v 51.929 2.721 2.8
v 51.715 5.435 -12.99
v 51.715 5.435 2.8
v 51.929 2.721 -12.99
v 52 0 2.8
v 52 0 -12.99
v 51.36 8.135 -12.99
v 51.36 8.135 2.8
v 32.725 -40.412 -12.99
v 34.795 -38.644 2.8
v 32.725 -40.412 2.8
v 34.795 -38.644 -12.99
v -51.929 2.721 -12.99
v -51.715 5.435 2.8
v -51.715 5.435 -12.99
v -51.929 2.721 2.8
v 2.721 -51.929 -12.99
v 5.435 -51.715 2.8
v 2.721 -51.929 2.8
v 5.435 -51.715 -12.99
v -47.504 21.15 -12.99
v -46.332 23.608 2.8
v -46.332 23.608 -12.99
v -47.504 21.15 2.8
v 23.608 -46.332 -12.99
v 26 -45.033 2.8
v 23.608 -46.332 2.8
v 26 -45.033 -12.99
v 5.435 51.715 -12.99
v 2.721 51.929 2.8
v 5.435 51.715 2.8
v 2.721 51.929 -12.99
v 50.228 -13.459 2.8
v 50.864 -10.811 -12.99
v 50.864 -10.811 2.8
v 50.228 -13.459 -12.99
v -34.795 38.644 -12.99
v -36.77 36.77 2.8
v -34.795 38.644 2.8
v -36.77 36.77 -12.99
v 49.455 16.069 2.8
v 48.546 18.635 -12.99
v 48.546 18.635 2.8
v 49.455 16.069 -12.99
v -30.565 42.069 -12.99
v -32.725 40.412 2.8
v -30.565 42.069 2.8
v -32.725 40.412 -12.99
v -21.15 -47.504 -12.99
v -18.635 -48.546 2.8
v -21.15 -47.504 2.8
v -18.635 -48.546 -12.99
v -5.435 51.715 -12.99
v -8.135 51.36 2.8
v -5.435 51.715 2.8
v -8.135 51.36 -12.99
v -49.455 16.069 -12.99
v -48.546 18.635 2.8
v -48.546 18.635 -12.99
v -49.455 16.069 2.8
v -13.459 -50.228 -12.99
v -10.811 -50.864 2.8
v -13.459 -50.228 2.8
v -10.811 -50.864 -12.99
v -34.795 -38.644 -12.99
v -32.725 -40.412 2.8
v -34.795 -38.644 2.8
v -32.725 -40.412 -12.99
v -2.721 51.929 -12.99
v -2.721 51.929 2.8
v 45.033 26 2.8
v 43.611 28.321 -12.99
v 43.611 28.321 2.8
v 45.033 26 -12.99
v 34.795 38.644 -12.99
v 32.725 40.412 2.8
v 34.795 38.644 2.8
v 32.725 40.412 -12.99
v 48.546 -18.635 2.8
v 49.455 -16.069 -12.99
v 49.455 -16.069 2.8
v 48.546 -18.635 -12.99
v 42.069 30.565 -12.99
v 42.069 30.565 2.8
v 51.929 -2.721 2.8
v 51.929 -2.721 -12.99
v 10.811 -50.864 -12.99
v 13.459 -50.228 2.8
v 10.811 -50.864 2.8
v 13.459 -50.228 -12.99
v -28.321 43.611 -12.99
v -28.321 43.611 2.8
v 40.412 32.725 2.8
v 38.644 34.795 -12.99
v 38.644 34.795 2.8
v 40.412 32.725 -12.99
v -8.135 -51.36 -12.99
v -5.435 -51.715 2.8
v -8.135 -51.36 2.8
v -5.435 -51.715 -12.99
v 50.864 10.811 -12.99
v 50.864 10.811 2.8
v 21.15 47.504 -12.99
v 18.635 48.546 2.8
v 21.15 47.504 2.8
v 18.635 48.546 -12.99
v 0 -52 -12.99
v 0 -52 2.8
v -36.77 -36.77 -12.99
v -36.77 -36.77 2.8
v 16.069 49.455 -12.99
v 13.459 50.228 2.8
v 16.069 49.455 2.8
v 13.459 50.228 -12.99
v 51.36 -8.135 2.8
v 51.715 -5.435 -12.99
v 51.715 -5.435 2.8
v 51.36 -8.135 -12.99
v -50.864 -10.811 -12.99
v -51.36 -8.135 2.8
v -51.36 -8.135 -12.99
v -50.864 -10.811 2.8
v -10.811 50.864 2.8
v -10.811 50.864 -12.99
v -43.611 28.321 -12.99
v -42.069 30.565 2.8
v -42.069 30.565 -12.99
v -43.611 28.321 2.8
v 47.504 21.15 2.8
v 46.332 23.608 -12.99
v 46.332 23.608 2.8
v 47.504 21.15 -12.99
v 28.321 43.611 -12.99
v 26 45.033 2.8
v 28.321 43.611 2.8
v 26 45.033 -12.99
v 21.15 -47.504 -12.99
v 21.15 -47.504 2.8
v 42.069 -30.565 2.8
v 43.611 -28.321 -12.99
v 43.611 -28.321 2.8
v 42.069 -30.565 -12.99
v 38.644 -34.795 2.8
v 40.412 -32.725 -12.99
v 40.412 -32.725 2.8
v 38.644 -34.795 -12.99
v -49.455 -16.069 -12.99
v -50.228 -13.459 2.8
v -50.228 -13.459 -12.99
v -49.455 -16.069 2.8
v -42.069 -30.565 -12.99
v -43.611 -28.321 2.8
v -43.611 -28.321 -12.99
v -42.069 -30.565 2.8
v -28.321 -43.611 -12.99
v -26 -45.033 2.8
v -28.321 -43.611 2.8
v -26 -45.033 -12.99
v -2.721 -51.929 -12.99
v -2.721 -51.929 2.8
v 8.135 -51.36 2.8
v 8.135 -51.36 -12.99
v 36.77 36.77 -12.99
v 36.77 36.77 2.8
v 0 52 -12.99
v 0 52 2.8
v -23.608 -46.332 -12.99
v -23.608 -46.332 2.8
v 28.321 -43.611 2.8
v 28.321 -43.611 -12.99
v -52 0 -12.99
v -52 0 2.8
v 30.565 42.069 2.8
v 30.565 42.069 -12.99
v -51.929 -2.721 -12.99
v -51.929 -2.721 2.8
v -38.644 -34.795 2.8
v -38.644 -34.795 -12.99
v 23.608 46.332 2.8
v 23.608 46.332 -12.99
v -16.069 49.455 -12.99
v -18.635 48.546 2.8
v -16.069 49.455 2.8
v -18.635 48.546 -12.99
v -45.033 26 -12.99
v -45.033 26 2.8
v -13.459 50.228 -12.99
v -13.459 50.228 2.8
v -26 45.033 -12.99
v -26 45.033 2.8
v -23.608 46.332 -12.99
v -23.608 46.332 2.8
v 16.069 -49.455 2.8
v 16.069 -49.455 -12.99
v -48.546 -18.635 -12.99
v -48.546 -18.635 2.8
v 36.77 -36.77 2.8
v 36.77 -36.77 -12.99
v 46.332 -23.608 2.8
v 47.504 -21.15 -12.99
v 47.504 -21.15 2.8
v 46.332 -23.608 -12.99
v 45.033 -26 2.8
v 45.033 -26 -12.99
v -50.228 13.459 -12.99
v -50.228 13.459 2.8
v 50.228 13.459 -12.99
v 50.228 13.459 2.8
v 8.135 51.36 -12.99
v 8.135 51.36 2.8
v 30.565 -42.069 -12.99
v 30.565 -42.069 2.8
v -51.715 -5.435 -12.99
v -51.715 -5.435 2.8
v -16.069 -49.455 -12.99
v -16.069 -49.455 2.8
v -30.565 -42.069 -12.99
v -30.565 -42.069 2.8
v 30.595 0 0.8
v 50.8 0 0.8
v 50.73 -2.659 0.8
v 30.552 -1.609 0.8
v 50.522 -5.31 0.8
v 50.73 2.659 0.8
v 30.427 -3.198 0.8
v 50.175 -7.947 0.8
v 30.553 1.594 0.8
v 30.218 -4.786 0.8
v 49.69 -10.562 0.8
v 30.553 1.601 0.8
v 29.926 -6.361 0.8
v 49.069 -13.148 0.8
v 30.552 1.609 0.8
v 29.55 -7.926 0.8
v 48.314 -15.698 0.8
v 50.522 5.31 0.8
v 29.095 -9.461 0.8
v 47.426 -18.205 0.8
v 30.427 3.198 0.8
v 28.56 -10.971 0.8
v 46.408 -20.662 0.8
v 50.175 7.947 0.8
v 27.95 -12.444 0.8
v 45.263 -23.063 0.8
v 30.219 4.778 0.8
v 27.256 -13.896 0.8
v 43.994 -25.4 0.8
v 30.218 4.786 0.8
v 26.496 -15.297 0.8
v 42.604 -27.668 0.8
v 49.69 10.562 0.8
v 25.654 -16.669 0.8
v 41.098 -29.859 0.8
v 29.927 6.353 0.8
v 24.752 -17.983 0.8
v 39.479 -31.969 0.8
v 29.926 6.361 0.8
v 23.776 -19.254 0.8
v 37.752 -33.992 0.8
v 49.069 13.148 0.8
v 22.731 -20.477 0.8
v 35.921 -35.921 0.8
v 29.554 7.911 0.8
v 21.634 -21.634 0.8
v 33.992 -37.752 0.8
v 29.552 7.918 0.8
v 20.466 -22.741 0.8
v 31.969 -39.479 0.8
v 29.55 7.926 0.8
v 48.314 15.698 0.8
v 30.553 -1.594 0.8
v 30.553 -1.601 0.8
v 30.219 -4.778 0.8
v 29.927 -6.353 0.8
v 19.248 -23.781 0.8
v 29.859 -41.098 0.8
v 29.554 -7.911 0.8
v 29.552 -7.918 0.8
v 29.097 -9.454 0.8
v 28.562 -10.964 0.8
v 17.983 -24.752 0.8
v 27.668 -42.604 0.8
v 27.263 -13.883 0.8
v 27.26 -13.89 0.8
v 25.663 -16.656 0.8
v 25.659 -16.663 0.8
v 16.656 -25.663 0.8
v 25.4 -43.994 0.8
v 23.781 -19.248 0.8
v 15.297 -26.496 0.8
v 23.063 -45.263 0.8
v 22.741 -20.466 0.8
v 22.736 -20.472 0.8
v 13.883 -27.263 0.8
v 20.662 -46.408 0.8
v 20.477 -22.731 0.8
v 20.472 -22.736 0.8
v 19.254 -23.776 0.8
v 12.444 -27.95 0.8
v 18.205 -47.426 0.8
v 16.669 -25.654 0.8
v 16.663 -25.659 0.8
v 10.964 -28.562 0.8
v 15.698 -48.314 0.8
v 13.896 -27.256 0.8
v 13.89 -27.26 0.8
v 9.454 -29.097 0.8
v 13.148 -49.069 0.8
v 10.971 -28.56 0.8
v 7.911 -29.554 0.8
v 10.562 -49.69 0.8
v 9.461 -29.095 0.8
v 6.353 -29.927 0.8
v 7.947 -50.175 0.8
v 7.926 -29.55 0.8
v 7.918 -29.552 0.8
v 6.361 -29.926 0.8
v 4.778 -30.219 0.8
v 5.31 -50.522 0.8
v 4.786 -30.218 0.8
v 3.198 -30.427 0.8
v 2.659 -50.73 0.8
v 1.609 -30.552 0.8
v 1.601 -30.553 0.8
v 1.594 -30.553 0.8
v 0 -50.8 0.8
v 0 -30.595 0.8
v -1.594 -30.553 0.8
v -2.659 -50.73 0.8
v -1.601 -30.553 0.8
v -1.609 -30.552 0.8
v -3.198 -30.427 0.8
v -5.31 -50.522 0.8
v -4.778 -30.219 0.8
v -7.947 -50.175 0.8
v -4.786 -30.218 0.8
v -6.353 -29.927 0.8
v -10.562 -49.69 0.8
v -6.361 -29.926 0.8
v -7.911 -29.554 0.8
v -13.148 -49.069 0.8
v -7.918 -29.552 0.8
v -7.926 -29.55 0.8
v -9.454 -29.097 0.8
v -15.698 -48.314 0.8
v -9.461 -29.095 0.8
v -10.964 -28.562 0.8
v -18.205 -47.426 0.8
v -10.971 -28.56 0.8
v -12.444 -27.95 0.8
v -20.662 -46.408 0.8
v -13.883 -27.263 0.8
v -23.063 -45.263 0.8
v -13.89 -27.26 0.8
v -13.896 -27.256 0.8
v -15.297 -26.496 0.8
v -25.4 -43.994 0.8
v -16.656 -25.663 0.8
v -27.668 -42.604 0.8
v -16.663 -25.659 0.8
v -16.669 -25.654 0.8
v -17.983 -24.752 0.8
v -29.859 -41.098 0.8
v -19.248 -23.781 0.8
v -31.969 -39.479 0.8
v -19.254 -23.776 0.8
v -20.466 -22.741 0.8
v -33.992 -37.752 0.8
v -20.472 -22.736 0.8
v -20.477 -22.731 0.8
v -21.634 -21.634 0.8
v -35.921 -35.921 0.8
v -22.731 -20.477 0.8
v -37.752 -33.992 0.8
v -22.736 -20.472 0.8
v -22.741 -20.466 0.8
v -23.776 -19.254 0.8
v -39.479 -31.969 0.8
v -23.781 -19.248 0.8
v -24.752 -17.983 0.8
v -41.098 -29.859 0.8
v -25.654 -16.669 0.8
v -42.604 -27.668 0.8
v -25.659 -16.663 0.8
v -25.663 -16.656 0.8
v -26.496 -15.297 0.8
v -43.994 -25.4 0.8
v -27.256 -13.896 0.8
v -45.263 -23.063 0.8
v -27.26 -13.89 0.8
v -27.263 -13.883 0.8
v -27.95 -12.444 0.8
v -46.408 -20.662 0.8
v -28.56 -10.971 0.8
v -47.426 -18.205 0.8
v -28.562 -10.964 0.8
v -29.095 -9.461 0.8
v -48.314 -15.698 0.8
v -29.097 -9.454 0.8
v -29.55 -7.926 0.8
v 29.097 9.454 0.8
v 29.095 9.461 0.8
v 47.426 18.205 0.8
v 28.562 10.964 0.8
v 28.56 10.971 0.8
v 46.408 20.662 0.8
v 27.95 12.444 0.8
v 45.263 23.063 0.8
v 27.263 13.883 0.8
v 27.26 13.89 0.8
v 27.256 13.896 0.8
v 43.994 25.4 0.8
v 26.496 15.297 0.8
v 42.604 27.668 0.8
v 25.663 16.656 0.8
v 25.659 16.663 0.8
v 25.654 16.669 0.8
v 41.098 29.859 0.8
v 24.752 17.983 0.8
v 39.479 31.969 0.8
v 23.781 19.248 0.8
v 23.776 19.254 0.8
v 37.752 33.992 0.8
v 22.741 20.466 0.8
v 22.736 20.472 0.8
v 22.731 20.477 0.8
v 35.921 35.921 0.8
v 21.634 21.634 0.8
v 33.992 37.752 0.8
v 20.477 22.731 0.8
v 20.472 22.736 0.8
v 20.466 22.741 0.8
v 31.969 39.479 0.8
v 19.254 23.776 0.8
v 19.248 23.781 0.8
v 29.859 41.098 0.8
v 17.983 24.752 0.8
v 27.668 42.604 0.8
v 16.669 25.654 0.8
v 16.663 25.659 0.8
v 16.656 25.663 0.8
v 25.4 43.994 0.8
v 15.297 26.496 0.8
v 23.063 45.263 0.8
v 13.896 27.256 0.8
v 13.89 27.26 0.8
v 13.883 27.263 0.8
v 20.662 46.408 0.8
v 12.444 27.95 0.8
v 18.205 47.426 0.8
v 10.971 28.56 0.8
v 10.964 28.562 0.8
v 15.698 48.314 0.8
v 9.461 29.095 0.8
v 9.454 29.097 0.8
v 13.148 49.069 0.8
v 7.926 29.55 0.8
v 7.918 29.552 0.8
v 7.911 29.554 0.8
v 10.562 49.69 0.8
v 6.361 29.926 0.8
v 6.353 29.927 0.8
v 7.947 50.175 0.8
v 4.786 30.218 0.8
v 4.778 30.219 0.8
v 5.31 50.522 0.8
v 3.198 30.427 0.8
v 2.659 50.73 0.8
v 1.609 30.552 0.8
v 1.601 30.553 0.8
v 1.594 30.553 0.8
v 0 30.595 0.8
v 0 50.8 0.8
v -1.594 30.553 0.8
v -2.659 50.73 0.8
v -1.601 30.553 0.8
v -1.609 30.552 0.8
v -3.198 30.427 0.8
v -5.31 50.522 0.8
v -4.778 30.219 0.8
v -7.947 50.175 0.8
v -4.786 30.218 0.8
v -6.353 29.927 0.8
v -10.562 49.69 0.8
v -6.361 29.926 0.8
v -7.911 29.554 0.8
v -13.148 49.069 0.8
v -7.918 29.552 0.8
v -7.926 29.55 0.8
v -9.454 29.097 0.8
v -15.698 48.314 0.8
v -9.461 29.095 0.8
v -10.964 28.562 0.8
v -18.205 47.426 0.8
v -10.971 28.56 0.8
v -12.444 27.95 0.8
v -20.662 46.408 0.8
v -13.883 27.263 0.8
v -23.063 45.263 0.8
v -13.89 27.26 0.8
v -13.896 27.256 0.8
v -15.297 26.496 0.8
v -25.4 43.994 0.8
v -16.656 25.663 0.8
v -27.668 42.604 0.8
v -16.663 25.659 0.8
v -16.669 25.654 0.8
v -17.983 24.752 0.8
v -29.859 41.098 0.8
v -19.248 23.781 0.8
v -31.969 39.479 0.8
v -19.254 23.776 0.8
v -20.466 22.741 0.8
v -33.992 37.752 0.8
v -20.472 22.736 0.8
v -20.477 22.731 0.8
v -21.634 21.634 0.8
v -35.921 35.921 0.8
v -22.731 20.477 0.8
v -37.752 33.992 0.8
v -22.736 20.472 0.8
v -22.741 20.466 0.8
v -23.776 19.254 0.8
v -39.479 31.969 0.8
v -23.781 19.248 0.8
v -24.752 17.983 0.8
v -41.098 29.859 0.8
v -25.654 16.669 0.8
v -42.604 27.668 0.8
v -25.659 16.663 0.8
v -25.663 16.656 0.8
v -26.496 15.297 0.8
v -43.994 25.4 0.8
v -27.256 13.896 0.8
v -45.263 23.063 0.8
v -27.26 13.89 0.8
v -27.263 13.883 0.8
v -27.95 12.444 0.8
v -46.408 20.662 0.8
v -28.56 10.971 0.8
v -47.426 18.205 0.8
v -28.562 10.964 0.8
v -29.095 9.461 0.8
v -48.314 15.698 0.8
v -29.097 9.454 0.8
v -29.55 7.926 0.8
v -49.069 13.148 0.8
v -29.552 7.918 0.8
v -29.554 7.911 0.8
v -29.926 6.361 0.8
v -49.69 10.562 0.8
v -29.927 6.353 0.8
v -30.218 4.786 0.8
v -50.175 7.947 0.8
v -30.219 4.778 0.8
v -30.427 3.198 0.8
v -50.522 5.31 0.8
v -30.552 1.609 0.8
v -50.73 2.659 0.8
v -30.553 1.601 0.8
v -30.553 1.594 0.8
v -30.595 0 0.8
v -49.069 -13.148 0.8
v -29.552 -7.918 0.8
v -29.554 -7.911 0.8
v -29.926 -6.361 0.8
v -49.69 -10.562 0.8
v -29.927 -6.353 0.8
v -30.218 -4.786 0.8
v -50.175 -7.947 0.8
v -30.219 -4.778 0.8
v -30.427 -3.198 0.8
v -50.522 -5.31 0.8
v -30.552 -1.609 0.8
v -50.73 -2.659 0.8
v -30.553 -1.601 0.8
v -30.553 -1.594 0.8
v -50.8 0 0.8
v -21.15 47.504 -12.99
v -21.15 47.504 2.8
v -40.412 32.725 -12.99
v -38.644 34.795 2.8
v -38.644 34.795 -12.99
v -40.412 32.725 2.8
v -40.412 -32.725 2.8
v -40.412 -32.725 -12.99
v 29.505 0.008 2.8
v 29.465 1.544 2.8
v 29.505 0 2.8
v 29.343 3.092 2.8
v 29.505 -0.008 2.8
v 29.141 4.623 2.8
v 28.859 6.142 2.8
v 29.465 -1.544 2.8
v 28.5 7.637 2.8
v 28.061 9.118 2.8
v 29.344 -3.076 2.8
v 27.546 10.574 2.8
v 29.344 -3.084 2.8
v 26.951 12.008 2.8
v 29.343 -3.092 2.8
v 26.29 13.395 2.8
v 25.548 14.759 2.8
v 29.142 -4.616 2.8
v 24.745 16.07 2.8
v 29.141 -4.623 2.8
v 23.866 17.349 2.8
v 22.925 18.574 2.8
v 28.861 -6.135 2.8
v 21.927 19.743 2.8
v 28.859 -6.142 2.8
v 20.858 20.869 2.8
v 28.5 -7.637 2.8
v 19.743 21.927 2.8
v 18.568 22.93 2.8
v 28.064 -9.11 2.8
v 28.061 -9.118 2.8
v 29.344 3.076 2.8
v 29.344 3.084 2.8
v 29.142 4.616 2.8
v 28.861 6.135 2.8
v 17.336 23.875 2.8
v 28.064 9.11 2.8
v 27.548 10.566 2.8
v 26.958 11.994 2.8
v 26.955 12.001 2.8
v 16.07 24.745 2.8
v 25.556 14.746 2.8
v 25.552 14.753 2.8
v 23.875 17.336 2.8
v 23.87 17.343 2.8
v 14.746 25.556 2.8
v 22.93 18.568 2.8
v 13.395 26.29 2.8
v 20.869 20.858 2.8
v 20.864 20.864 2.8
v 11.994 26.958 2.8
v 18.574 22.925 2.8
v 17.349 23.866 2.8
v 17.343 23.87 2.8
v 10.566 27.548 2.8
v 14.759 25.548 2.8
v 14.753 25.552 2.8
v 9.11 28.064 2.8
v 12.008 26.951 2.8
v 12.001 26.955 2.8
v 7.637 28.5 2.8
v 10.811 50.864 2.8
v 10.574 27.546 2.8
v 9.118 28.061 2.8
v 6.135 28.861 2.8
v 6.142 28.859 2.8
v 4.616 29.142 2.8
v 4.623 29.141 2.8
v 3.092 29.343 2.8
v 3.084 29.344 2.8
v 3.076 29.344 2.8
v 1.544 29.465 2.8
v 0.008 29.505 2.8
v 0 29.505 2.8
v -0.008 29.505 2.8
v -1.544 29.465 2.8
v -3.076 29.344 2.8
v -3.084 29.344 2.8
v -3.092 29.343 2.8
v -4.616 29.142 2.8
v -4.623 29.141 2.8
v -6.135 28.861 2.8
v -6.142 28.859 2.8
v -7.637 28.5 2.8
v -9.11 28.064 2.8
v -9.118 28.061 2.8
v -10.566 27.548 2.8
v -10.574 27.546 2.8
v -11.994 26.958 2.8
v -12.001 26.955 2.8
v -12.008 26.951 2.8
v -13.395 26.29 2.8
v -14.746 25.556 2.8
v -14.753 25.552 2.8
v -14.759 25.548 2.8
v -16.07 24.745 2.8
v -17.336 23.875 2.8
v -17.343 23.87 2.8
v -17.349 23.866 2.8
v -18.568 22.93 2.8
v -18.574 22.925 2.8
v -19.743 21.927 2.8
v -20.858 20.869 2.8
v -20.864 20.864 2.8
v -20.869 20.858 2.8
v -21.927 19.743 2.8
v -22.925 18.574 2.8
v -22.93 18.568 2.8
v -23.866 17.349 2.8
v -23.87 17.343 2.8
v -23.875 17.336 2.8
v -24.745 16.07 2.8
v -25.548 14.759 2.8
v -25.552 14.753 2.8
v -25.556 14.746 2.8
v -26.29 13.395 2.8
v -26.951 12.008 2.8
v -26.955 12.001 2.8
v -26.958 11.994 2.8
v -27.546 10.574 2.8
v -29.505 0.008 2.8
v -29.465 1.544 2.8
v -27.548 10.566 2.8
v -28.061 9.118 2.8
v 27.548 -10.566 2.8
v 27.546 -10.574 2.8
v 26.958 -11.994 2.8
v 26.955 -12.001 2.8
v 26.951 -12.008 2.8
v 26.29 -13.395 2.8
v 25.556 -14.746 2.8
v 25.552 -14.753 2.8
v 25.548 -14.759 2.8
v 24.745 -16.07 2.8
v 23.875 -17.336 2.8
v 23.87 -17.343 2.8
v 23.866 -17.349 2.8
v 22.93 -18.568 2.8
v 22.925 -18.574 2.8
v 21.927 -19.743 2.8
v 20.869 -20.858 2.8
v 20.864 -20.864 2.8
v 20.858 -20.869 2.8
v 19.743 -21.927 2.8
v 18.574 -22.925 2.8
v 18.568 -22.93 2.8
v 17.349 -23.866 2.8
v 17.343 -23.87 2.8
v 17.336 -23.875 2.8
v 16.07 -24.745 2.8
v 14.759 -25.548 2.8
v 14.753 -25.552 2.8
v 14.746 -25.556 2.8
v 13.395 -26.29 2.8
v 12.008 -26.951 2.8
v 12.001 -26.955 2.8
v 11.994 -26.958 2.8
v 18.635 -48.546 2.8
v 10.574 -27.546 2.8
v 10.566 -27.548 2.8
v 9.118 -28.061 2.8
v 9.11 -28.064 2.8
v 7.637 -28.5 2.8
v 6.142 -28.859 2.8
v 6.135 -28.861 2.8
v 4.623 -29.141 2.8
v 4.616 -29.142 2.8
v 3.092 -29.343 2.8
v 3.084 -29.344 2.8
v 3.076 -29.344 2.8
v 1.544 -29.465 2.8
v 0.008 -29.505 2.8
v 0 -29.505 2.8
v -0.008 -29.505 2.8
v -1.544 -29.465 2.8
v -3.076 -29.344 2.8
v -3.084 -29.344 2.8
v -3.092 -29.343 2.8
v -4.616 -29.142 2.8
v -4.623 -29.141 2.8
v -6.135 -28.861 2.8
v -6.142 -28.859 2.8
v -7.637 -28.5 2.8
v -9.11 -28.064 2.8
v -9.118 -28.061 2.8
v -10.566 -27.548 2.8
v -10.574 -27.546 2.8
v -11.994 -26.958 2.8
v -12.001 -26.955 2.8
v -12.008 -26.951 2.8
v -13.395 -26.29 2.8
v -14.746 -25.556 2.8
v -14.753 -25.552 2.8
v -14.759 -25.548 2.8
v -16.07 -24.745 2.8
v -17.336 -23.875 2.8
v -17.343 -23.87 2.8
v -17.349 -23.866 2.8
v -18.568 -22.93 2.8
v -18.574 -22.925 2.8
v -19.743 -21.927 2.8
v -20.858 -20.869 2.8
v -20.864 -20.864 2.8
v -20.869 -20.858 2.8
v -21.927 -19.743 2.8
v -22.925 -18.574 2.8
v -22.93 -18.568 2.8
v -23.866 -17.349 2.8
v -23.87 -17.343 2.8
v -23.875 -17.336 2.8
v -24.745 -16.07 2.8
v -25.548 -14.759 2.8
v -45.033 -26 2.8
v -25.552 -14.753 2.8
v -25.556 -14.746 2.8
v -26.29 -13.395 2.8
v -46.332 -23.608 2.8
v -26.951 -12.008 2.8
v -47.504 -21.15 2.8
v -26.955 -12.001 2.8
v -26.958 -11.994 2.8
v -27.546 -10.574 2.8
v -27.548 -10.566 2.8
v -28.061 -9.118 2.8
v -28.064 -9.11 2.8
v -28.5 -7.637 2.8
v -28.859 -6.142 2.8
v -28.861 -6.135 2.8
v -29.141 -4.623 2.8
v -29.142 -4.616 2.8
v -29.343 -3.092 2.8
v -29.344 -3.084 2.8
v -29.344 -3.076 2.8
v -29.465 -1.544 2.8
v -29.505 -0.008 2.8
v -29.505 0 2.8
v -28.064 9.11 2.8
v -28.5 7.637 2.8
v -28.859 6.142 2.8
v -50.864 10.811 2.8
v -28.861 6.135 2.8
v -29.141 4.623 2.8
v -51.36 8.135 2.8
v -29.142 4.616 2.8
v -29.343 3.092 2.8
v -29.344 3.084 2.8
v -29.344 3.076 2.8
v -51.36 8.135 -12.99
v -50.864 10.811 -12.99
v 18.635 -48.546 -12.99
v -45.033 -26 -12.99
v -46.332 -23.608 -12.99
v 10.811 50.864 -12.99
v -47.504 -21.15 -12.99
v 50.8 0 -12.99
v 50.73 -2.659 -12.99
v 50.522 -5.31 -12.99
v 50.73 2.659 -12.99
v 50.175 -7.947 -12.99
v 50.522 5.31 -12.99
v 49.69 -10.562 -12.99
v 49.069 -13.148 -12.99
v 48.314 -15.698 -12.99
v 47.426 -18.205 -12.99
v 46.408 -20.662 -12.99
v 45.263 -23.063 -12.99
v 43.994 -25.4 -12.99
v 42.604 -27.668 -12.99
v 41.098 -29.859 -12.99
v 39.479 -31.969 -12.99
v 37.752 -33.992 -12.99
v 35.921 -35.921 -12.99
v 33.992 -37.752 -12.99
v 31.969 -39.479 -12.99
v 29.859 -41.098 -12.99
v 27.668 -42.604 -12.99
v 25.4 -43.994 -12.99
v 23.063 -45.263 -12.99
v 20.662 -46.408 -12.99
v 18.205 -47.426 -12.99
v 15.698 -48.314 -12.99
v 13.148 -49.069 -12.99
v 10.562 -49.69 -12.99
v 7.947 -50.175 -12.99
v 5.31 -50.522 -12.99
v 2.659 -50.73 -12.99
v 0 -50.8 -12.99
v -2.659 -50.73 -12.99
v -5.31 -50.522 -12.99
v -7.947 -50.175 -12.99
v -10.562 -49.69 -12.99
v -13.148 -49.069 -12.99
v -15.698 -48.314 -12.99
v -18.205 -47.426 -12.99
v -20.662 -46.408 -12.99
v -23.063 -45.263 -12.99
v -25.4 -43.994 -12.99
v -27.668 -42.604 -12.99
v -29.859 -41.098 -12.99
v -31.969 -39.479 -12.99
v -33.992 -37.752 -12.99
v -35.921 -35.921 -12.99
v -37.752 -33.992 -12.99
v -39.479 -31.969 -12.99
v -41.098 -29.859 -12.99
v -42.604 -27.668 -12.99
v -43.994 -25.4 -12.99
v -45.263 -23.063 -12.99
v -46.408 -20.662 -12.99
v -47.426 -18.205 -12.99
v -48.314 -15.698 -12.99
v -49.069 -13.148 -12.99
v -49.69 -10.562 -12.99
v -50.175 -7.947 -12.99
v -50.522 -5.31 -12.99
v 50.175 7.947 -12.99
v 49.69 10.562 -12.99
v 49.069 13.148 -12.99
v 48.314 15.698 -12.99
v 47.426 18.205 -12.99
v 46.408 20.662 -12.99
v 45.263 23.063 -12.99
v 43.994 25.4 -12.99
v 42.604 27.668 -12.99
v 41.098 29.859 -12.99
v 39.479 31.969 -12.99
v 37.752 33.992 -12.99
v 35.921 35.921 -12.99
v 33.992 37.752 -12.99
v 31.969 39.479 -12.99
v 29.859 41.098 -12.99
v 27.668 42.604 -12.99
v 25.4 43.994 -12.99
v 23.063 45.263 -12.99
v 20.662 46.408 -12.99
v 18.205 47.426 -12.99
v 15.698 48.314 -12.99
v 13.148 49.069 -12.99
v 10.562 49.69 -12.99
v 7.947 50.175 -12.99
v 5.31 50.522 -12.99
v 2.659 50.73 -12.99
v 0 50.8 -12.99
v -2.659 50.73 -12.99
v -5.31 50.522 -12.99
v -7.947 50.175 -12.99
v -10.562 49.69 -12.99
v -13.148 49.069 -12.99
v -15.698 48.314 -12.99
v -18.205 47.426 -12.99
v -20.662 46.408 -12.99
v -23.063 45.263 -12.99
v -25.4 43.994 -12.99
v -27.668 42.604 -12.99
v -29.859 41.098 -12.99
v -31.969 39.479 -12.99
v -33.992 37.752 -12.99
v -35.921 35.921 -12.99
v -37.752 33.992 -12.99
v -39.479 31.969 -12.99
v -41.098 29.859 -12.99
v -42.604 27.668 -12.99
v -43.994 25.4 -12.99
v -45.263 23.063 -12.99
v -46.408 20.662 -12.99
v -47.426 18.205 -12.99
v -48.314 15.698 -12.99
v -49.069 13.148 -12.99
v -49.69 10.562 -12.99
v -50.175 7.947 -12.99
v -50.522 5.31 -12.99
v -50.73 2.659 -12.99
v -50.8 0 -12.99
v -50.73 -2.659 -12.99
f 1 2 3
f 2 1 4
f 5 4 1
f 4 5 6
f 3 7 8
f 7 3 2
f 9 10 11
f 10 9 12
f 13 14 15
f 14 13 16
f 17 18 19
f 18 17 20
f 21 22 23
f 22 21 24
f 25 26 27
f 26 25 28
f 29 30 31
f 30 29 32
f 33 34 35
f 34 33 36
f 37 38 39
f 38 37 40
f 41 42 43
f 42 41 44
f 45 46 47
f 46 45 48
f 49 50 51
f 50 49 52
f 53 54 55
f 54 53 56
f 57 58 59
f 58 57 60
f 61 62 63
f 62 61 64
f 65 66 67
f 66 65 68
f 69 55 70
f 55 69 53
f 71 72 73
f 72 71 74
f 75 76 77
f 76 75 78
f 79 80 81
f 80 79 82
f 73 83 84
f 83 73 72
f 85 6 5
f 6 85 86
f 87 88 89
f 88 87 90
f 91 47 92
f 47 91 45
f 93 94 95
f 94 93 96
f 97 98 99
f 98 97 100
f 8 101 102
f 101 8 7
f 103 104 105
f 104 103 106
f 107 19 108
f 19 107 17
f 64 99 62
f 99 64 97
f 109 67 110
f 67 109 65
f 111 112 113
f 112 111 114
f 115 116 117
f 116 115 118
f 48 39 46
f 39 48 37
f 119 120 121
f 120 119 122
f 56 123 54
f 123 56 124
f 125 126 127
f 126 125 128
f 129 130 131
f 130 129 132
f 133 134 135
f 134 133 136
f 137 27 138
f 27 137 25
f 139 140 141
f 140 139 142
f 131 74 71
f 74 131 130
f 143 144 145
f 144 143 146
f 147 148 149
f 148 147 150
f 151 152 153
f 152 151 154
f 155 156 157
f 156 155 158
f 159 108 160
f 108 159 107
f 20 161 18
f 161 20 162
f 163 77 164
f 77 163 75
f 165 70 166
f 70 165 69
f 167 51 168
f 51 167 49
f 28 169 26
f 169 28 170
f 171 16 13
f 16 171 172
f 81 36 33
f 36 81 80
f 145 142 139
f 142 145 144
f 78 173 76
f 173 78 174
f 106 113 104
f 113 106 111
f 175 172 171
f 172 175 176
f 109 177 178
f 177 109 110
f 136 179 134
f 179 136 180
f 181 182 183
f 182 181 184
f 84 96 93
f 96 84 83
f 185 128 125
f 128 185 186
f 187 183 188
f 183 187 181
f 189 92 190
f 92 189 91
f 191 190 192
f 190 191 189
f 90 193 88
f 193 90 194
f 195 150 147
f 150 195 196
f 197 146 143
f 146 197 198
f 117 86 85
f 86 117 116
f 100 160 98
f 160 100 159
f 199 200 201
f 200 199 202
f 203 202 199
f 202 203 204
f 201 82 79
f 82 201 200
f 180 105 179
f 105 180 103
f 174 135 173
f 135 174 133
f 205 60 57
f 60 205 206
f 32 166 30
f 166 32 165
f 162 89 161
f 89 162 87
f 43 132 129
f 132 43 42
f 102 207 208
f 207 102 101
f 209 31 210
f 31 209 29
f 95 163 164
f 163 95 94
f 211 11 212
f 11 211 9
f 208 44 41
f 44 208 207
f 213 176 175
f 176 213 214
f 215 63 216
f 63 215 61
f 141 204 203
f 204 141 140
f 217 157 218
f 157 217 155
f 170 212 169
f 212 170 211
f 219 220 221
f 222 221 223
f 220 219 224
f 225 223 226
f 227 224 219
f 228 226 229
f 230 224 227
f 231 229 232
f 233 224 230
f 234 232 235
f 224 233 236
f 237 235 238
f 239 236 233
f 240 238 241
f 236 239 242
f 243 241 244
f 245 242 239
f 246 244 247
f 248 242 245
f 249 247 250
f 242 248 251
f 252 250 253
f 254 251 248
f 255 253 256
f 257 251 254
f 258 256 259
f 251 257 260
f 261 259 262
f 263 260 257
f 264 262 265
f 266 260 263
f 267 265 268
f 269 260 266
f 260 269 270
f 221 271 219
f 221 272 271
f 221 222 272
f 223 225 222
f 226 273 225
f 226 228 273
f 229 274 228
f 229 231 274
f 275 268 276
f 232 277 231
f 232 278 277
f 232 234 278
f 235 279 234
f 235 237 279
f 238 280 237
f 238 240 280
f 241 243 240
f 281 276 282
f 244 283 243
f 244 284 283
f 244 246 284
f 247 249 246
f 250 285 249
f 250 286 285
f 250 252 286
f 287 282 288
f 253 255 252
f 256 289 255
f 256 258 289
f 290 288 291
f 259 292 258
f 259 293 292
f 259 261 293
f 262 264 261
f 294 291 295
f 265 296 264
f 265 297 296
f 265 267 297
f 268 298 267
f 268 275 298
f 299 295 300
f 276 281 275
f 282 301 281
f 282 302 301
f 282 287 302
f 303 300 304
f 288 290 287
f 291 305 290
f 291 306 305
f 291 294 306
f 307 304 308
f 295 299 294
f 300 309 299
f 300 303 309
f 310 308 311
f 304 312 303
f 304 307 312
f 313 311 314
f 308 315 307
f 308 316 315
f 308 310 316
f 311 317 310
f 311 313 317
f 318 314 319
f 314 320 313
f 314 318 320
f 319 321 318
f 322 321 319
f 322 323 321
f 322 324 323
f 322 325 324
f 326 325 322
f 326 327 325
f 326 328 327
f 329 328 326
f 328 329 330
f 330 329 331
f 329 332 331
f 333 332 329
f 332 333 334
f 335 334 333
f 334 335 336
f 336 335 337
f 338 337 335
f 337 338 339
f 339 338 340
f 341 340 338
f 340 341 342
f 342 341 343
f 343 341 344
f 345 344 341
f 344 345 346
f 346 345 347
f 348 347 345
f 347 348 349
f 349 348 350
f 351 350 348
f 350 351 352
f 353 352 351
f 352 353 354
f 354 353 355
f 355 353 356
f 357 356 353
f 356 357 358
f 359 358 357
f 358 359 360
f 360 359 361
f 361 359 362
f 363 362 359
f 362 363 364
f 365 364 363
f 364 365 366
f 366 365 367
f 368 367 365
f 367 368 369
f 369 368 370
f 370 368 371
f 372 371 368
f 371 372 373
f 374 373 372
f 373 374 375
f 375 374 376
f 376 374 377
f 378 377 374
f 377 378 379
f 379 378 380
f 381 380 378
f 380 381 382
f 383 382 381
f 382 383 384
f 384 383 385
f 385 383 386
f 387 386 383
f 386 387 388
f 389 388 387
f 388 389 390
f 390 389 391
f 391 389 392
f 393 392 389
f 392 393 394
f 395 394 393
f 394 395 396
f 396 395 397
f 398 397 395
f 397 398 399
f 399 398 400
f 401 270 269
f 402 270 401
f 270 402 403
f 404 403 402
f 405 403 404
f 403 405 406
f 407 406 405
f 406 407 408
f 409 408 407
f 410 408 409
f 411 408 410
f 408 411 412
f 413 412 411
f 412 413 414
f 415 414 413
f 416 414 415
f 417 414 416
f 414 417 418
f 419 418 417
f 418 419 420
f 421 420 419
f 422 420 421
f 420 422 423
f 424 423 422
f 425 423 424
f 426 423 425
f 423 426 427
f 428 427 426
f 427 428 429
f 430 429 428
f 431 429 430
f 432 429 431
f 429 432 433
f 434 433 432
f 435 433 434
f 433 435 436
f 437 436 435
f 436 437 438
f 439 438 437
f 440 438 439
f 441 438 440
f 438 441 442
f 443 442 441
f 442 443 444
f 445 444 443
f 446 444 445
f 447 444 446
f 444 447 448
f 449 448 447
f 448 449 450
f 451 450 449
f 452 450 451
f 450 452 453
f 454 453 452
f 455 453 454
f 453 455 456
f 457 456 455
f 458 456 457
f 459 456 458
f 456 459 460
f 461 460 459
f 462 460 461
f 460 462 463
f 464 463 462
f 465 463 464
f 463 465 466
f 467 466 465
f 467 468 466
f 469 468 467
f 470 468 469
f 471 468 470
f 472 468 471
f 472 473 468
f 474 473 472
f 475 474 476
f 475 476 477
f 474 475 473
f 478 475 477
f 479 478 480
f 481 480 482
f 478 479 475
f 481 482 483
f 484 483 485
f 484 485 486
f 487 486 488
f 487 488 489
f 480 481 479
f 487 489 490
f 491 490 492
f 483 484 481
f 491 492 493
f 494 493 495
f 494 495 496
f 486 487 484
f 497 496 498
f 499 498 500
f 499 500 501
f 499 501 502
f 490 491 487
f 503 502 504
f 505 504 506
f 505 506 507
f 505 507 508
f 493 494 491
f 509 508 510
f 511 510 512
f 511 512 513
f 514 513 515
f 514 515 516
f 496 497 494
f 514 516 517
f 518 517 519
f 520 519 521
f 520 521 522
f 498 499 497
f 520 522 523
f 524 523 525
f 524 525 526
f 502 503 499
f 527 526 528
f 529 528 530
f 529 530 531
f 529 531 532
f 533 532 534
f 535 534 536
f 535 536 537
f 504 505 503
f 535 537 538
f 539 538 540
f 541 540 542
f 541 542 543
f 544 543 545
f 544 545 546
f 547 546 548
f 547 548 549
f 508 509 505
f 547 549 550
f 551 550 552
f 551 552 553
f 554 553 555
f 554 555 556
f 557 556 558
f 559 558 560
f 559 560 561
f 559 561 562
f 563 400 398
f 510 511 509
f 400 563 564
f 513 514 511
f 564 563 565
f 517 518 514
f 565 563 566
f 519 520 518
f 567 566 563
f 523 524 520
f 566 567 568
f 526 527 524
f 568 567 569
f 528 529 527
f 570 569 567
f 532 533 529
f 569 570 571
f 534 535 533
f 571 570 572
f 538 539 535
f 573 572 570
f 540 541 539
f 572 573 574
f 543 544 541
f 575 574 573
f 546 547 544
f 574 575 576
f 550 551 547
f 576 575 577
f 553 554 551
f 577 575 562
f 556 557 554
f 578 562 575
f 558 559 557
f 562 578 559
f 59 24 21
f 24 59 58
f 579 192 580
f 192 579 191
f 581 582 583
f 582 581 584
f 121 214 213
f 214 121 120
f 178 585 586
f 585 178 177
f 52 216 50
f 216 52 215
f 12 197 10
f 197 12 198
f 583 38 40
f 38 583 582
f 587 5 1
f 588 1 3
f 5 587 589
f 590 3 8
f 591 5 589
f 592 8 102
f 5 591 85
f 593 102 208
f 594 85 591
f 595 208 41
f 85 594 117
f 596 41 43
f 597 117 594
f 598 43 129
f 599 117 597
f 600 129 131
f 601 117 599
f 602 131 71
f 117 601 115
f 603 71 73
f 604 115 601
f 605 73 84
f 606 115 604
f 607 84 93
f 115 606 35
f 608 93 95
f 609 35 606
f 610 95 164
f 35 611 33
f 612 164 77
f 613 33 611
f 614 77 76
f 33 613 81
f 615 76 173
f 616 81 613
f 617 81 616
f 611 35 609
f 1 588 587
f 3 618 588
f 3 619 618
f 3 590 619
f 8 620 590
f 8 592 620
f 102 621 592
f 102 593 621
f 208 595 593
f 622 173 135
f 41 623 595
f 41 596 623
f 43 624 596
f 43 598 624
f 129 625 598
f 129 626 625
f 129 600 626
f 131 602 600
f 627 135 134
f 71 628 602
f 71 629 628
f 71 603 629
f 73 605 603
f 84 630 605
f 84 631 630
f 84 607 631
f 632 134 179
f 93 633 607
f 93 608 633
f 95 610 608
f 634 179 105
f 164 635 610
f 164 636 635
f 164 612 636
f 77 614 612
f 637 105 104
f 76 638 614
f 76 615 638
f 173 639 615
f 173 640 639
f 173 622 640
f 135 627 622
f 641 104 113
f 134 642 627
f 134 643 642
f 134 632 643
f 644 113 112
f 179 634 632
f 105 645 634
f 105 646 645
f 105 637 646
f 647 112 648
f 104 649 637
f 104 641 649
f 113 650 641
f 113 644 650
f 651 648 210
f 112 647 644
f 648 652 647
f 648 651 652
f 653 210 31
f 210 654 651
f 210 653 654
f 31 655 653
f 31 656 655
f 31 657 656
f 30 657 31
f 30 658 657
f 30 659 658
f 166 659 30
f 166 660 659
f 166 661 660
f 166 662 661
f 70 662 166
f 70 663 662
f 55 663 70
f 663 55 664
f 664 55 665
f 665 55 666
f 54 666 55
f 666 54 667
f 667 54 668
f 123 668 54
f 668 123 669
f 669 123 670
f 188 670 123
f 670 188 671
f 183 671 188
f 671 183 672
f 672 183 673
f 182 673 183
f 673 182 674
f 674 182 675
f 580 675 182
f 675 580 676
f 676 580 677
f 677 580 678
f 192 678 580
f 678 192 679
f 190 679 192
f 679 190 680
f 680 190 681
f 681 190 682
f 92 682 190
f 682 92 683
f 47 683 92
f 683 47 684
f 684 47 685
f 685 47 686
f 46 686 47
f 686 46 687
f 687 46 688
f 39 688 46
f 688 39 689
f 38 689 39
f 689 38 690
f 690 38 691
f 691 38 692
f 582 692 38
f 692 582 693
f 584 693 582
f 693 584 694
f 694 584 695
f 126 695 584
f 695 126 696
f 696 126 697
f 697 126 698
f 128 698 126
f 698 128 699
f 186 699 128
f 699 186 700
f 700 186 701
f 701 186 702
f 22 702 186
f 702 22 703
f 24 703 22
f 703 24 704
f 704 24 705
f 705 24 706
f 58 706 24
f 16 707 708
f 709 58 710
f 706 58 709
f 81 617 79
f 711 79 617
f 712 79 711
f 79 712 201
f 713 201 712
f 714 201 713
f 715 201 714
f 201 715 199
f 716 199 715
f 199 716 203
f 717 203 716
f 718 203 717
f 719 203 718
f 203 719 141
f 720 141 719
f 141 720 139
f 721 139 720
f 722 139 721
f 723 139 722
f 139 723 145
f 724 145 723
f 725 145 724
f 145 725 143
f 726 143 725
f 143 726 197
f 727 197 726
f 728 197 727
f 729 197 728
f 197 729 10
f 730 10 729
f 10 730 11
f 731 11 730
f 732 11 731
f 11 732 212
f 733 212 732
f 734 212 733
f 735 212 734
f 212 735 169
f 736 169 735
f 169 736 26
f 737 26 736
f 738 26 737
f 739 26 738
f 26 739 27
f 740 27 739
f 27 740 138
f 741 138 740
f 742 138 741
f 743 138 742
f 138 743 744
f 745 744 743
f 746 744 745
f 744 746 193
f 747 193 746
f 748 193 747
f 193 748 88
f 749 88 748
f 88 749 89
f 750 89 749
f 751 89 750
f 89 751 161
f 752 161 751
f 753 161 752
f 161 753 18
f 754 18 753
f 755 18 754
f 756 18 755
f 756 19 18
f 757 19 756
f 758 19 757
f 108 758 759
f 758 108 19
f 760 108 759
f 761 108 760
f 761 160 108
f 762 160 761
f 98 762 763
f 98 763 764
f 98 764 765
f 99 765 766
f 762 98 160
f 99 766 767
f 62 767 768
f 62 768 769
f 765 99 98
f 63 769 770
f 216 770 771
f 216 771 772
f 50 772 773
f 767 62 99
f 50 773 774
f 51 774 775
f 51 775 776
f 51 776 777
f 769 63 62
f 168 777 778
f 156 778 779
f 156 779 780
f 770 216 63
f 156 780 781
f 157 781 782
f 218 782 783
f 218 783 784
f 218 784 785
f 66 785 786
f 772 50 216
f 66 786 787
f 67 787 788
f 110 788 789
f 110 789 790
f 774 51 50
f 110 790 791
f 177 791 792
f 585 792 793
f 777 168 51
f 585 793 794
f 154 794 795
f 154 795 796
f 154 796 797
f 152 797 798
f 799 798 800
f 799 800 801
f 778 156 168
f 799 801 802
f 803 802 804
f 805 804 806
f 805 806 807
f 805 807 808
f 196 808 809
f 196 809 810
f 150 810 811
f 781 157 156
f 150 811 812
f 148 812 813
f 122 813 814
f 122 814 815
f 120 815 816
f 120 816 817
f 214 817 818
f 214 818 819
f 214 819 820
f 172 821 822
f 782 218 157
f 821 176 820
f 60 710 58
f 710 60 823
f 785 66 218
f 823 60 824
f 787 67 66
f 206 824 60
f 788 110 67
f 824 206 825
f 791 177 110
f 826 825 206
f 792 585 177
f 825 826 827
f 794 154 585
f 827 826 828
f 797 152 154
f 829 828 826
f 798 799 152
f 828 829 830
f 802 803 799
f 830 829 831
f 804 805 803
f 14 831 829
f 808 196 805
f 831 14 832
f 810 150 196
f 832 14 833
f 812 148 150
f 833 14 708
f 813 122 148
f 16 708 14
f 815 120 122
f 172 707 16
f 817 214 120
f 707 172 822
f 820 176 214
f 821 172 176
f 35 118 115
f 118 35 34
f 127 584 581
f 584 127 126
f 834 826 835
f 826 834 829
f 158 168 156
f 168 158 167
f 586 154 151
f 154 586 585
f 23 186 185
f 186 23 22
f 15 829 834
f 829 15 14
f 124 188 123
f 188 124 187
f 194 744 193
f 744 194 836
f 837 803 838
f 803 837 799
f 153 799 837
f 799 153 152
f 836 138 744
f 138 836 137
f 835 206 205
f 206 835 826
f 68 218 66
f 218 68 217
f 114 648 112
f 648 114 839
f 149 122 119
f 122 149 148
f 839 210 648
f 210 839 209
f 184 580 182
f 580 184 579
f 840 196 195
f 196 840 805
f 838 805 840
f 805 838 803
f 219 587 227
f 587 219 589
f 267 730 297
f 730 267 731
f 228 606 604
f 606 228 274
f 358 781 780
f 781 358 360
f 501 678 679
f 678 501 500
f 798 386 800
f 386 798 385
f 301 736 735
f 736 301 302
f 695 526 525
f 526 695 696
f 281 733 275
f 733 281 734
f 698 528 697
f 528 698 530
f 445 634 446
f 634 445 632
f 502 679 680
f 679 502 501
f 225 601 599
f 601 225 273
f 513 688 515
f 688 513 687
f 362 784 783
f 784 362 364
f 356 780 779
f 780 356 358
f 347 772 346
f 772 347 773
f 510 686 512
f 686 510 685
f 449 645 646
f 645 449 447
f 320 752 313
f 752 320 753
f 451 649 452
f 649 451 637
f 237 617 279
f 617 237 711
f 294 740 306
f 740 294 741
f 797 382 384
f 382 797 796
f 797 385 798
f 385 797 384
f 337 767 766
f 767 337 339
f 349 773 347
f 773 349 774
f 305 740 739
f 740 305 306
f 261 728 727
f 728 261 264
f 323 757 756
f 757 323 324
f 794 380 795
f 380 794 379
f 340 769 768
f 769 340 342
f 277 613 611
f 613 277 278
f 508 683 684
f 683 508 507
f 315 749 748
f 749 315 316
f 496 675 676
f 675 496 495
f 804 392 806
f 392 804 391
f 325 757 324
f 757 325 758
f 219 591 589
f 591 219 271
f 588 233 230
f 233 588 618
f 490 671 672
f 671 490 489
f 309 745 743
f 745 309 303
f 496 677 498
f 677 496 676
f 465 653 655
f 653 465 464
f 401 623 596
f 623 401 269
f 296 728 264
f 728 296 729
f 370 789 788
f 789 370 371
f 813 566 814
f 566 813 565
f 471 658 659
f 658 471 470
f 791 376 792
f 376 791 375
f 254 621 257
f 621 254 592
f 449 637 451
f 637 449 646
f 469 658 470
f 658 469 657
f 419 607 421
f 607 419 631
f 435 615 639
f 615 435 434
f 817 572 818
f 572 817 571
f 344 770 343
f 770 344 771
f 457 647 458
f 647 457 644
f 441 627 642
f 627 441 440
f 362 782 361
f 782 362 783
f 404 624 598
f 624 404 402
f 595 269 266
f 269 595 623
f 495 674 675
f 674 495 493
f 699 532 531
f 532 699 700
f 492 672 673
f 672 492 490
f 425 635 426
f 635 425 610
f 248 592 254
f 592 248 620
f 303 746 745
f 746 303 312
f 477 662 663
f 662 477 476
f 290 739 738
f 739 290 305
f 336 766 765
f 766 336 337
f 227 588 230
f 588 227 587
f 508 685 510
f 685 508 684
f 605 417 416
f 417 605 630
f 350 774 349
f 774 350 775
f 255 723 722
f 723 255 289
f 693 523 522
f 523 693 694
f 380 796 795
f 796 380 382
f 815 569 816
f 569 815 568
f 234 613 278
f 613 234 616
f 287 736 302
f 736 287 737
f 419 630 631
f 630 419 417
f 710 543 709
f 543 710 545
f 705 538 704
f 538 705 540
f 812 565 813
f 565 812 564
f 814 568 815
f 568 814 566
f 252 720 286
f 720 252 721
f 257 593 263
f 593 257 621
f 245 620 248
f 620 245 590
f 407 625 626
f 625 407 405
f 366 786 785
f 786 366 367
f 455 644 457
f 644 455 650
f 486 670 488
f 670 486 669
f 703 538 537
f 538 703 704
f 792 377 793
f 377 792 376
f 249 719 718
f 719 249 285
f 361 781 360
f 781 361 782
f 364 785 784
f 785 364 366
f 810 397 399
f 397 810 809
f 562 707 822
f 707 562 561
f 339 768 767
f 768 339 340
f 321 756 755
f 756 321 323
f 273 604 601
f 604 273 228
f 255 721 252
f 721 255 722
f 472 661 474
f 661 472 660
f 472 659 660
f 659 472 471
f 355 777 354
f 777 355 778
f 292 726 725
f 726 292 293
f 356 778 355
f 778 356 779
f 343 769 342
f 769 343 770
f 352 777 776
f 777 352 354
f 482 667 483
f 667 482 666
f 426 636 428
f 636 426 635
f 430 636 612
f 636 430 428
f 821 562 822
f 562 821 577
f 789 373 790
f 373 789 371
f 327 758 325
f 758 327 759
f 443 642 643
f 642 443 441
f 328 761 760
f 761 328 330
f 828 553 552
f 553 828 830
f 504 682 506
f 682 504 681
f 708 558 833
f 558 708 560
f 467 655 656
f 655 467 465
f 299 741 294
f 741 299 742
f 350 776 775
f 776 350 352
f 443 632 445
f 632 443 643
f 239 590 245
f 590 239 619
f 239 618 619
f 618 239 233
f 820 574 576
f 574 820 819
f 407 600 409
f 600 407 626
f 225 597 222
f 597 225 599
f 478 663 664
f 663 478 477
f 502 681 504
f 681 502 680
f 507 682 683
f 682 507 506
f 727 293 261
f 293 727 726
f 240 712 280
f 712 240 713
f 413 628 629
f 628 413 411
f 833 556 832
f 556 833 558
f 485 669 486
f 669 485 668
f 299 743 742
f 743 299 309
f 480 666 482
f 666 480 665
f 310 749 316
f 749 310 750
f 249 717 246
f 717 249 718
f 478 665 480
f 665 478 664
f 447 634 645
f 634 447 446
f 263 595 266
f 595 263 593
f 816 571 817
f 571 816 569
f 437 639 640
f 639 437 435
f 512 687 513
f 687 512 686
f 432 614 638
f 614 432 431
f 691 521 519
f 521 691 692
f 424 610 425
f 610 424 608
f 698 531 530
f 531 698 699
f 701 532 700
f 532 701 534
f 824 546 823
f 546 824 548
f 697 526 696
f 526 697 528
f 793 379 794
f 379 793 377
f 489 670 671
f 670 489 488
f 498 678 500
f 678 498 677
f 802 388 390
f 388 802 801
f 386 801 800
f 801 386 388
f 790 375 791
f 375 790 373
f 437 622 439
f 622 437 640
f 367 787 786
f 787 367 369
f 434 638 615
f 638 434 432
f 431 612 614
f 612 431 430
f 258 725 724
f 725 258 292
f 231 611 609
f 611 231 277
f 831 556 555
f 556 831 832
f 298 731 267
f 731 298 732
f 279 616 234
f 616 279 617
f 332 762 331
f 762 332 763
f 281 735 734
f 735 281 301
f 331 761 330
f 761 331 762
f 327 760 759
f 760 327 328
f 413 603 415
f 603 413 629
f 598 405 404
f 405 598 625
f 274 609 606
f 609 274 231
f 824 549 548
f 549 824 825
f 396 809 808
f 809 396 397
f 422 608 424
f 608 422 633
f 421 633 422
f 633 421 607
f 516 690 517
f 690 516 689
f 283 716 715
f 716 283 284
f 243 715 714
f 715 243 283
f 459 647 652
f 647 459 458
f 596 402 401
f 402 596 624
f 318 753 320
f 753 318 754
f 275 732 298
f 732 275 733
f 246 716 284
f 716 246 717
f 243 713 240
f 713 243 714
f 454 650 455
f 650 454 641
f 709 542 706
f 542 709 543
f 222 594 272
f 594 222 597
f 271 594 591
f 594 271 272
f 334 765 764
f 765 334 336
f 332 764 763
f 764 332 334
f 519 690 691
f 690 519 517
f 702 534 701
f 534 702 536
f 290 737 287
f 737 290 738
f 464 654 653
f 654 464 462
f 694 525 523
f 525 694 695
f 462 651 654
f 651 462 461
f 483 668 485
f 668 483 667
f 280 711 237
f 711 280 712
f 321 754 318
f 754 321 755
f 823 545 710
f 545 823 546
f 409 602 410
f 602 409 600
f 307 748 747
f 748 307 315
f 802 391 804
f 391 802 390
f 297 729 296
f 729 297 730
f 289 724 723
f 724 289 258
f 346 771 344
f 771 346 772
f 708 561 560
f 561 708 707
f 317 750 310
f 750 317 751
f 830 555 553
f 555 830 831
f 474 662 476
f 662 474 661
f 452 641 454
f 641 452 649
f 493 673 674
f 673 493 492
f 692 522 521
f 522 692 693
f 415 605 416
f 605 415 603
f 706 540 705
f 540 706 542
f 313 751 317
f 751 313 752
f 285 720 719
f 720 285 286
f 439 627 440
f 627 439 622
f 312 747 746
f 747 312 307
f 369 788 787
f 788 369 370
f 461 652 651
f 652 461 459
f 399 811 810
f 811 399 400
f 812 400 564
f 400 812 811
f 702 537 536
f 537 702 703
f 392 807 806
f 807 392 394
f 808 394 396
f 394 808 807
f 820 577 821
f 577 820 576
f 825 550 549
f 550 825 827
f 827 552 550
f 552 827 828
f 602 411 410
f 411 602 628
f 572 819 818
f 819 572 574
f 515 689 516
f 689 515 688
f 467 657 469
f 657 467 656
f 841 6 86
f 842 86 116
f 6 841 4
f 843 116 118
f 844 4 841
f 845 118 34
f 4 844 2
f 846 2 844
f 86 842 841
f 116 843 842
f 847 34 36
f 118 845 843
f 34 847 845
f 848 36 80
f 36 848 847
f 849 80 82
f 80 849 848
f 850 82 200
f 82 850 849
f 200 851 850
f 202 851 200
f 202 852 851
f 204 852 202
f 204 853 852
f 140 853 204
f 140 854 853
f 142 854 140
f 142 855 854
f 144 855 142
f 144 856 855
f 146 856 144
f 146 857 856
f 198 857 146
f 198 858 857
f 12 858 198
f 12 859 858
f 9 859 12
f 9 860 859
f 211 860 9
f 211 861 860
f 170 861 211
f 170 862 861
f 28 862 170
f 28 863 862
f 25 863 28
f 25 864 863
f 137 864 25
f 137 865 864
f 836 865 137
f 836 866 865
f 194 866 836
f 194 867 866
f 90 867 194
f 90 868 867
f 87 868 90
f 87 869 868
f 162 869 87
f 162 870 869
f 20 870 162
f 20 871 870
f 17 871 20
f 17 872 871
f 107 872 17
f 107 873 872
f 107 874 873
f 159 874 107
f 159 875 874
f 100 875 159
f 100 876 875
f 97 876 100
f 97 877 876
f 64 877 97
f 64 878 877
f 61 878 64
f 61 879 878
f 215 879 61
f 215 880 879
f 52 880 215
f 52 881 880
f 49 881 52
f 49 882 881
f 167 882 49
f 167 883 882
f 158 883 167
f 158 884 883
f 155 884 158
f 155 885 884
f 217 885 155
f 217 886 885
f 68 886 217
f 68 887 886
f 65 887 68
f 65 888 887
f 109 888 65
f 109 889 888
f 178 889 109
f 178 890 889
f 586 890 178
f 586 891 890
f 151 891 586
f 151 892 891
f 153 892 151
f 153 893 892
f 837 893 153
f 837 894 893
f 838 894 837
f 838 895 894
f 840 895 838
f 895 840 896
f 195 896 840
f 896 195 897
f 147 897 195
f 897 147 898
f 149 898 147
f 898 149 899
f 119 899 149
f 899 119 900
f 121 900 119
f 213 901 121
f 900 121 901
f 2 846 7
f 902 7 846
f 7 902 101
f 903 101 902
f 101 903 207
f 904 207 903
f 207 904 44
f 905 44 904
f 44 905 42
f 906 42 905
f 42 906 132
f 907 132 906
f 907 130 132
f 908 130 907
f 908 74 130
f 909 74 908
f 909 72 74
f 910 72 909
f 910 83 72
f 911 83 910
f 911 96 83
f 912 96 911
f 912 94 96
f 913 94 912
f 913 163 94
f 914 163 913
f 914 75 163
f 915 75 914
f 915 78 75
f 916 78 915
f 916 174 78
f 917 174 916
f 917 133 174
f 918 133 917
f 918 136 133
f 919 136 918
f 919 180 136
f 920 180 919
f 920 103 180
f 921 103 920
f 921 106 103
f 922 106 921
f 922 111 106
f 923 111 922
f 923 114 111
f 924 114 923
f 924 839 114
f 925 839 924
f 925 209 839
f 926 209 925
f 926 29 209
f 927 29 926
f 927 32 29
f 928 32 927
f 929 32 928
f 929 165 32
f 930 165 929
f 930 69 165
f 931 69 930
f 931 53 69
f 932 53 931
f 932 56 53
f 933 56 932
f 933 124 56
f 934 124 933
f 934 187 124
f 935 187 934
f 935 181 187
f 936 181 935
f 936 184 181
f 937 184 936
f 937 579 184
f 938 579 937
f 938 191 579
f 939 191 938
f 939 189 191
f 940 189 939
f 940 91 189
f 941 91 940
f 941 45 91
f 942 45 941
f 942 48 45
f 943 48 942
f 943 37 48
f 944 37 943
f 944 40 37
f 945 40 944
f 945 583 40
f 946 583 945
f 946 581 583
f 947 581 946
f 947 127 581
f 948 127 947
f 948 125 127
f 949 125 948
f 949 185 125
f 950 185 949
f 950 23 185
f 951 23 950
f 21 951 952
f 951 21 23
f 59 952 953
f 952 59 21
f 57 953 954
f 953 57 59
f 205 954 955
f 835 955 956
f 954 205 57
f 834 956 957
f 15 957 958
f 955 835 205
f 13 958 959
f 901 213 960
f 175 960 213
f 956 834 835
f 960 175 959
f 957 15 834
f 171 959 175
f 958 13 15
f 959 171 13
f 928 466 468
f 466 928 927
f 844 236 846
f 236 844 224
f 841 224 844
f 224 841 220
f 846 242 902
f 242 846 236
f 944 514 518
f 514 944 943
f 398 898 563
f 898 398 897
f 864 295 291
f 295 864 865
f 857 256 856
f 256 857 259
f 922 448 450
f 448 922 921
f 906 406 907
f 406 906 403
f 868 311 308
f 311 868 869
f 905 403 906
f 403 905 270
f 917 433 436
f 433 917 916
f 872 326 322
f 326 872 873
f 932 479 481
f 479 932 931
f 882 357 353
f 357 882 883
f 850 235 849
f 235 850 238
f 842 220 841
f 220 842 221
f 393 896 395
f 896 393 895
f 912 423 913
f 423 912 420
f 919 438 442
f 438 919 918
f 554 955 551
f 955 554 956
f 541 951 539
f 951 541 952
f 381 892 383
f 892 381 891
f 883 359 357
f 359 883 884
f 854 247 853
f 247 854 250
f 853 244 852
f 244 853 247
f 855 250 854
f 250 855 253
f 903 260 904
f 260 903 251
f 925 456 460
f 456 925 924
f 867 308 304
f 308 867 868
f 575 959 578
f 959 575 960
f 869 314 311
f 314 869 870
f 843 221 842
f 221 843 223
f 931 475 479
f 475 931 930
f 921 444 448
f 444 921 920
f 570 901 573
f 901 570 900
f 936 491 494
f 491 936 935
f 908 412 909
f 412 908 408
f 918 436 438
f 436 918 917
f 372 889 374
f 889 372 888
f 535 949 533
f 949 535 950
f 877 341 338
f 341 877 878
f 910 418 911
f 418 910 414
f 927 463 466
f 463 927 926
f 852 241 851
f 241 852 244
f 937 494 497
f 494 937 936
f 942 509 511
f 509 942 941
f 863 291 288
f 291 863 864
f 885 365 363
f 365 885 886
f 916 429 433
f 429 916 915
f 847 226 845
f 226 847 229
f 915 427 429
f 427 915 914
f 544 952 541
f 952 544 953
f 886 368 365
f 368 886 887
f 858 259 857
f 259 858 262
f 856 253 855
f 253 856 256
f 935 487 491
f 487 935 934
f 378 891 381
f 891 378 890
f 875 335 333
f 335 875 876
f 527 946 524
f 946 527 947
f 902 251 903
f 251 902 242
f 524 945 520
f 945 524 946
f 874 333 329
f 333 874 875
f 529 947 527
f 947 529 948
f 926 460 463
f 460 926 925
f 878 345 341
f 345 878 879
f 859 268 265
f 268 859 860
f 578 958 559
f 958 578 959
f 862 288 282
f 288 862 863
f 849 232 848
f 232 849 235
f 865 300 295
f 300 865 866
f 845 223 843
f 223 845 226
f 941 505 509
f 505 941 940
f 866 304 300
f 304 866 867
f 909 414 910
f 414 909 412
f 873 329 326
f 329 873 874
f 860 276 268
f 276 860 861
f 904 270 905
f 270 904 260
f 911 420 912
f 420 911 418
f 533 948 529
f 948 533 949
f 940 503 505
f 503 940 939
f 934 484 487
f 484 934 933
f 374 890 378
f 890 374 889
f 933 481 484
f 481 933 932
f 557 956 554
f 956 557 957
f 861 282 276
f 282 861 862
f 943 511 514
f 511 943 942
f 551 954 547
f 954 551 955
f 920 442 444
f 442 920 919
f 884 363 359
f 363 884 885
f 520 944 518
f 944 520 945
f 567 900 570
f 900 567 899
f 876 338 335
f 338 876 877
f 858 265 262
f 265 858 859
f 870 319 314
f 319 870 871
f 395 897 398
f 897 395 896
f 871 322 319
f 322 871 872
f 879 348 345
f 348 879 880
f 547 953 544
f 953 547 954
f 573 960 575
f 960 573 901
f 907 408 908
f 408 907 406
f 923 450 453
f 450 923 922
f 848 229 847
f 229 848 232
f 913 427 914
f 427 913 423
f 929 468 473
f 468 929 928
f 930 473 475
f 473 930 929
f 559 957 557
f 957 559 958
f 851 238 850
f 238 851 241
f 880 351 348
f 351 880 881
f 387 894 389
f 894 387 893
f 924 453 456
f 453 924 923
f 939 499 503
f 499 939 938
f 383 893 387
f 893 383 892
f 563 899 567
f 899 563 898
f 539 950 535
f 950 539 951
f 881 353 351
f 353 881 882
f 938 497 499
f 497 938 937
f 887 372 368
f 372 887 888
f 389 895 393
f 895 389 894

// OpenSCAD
// file: camera_pod_60mm.scad
module  minkowski_square(dimension, r=2)
{
    minkowski()
    {
        square([dimension.x-r*2,dimension.y-r*2], center=true);
        circle(r=r);
    }
}

module camera_pod(dome_dia=50.8, outer_dia=60, inner_dia=44, tube_thick=2, seal_margin=0.4)
{
    h=15;//need to be ajust for lens height
    difference(){
        cylinder(r=outer_dia/2, h=h);
        translate([0, 0, h-1])
        cylinder(r=dome_dia/2+seal_margin, h=10.01);
        cylinder(r=inner_dia/2, h=100, center=true);
        translate([0, 0, h-10-100])
        linear_extrude(h=100)
        minkowski_square(dimension=[38+0.5,38+0.5], r=1, $fn=100);
        //camera : outline 38x38, hole 34x34
        camera_bolt_r = 1.7/2;
        for(i=[0:11]){
            r=34*sqrt(2)/2;
            translate([r*cos((i+0.5)*360/12), r*sin((i+0.5)*360/12)])
                cylinder(r=camera_bolt_r, h=100, center=true);
        }
        translate([0, 0, 5-100])
        difference(){
            cylinder(r=outer_dia/2+0.01, h=100);
            cylinder(r=outer_dia/2-tube_thick-seal_margin, h=100);
        }
    }
}

$fn=360;
camera_pod();
 
// file: dome_base.scad
include<params.scad>

module  minkowski_square(dimension, r=2)
{
    minkowski()
    {
        square([dimension.x-r*2,dimension.y-r*2], center=true);
        circle(r=r);
    }
}

module dome_base(dome_base_dia=60, inner_dia=44, tube_thick=2, h=10)
{
    lenshole_dia=15.8;
    //h need to be ajust for lens height
    difference(){
        cylinder(r1=dome_base_dia/2, r2=DOME_DIA/2, h=h);
        translate([0,0,-1.5])
        cylinder(r=inner_dia/2, h=h);
        cylinder(r=lenshole_dia/2, h=100, center=true);
        //camera : outline 38x38, hole 34x34
        camera_bolt_r = 1.7/2;
        for(i=[0:11]){
            r=34*sqrt(2)/2;
            translate([r*cos((i+0.5)*360/12), r*sin((i+0.5)*360/12), 3])
                mirror([0,0,1])
                cylinder(r=camera_bolt_r, h=100);
        }
    }
}

$fn=120;
dome_base();
 
// file: dome_base_cover.scad
include<params.scad>

module  minkowski_square(dimension, r=2)
{
    minkowski()
    {
        square([dimension.x-r*2,dimension.y-r*2], center=true);
        circle(r=r);
    }
}
//DOME_DIA + SEAL_MARGIN*2+3
module dome_base_cover(outer_dia=64, dome_base_dia=60, inner_dia=60, tube_thick=2)
{
    h=10;
    overlap_h=10;
    
    difference(){
        intersection(){
            _r = DOME_DIA/2 + SEAL_MARGIN;
            _x = sqrt(_r*_r - overlap_h*overlap_h)+1;
            _h = sqrt(outer_dia*outer_dia/4 - _x*_x);
            translate([0, 0, (h+overlap_h)/2])
            cube([100,100,h+overlap_h],center=true);
            scale([1,1,(h+overlap_h)/_h])
            sphere(r=outer_dia/2);
        }
        translate([0, 0, -0.01])
        cylinder(r1=dome_base_dia/2+SEAL_MARGIN, r2=DOME_DIA/2+SEAL_MARGIN, h=h+0.02);
        translate([0, 0, h])
        sphere(r=DOME_DIA/2+SEAL_MARGIN);
    }
}

$fn=120;
dome_base_cover();
 
// file: camera_pod_100mm.scad
include<params.scad>
use<camera_pod_60mm.scad>

module  minkowski_square(dimension, r=2)
{
    minkowski()
    {
        square([dimension.x-r*2,dimension.y-r*2], center=true);
        circle(r=r);
    }
}
module  minkowski_square_3d(dimension, r=2)
{
    minkowski()
    {
        cube([dimension.x-r*2,dimension.y-r*2, 0.01], center=true);
        sphere(r=r);
    }
}

module camera_pod_100mm(outer_dia=100, inner_dia=44, tube_thick=2, b_cable=false)
{
    h=10;//need to be ajust for lens height
    difference(){
        union(){
//            translate([0, 0, 3])
//            dome_base(outer_dia=60, h=h);
            difference(){
                cylinder(r=outer_dia/2-0.4, h=3);
                cylinder(r=inner_dia/2, h=100, center=true);
            }
            translate([0, 0, 0.01])
            mirror([0,0,1])
            difference(){
                cylinder(r1=outer_dia/2-tube_thick+0.05,r2=outer_dia/2-tube_thick-0.4, h=5);
                cylinder(r=outer_dia/2-tube_thick-5, h=100, center=true);
            }
        }
        translate([0, 0, 3+0.01])
        mirror([0,0,1])
        linear_extrude(h=100)
        minkowski_square(dimension=[38+0.5,38+0.5], r=1, $fn=100);
        //camera : outline 38x38, hole 34x34
        camera_bolt_r = 1.7/2;
        for(i=[0:11]){
            r=34*sqrt(2)/2;
            translate([r*cos((i+0.5)*360/12), r*sin((i+0.5)*360/12), 3+3])
                mirror([0,0,1])
                cylinder(r=camera_bolt_r, h=100);
        }
    }
}
$fn=120;
camera_pod_100mm();
 
// file: params.scad
DOME_DIA = 51.2;
DOME_THICK = 2.5;
SEAL_MARGIN = 0.8;
PROP_SHROUD_DIA = 50;
PROP_SHROUD_THICK = 2.5;
SHELL_MARGIN = 0.4;
SHELL_THICK= 1.6;
SKREW_INNER_DIA = 23.3;
SKREW_OUTER_DIA = 26.5;
CHAMBER_DIA = 100;
LED_ENABLED = false;

function r_from_dia(d) = d / 2;
// main file
include<params.scad>
use<camera_pod_100mm.scad>
use<dome_base_cover.scad>
use<dome_base.scad>
module  minkowski_square(dimension, r=2)
{
    minkowski()
    {
        square([dimension.x-r*2,dimension.y-r*2], center=true);
        circle(r=r);
    }
}

module camera_pod_cover_100mm_1(dome_base_dia=64, outer_dia=104, inner_dia=100, tube_thick=2)
{
    translate([0, 0, SEAL_MARGIN])
    difference(){
        cylinder(r=outer_dia/2, h=2);
        translate([0, 0, -0.01])
        cylinder(r1=dome_base_dia/2-2.2+SEAL_MARGIN, r2=dome_base_dia/2-3.3+SEAL_MARGIN, h=2.02);
    }
    overlap_h=10+3;
    translate([0, 0, -overlap_h+0.01])
    difference(){
        cylinder(r=outer_dia/2, h=overlap_h+SEAL_MARGIN);
        translate([0, 0, -0.01])
        cylinder(r=inner_dia/2+SEAL_MARGIN, h=overlap_h+0.02+SEAL_MARGIN);
    }
}

module camera_pod_cover_100mm_2(dome_base_dia=64, outer_dia=104, inner_dia=100, tube_thick=2)
{
    thick=2;
    difference(){
        dome_base_cover();
        translate([0, 0, -0.01])
        cylinder(r=dome_base_dia/2+0.01, h=thick+SEAL_MARGIN+0.01);
    }
}

$fn=120;
camera_pod_cover_100mm_1();
//camera_pod_cover_100mm_2();
//dome_base();
